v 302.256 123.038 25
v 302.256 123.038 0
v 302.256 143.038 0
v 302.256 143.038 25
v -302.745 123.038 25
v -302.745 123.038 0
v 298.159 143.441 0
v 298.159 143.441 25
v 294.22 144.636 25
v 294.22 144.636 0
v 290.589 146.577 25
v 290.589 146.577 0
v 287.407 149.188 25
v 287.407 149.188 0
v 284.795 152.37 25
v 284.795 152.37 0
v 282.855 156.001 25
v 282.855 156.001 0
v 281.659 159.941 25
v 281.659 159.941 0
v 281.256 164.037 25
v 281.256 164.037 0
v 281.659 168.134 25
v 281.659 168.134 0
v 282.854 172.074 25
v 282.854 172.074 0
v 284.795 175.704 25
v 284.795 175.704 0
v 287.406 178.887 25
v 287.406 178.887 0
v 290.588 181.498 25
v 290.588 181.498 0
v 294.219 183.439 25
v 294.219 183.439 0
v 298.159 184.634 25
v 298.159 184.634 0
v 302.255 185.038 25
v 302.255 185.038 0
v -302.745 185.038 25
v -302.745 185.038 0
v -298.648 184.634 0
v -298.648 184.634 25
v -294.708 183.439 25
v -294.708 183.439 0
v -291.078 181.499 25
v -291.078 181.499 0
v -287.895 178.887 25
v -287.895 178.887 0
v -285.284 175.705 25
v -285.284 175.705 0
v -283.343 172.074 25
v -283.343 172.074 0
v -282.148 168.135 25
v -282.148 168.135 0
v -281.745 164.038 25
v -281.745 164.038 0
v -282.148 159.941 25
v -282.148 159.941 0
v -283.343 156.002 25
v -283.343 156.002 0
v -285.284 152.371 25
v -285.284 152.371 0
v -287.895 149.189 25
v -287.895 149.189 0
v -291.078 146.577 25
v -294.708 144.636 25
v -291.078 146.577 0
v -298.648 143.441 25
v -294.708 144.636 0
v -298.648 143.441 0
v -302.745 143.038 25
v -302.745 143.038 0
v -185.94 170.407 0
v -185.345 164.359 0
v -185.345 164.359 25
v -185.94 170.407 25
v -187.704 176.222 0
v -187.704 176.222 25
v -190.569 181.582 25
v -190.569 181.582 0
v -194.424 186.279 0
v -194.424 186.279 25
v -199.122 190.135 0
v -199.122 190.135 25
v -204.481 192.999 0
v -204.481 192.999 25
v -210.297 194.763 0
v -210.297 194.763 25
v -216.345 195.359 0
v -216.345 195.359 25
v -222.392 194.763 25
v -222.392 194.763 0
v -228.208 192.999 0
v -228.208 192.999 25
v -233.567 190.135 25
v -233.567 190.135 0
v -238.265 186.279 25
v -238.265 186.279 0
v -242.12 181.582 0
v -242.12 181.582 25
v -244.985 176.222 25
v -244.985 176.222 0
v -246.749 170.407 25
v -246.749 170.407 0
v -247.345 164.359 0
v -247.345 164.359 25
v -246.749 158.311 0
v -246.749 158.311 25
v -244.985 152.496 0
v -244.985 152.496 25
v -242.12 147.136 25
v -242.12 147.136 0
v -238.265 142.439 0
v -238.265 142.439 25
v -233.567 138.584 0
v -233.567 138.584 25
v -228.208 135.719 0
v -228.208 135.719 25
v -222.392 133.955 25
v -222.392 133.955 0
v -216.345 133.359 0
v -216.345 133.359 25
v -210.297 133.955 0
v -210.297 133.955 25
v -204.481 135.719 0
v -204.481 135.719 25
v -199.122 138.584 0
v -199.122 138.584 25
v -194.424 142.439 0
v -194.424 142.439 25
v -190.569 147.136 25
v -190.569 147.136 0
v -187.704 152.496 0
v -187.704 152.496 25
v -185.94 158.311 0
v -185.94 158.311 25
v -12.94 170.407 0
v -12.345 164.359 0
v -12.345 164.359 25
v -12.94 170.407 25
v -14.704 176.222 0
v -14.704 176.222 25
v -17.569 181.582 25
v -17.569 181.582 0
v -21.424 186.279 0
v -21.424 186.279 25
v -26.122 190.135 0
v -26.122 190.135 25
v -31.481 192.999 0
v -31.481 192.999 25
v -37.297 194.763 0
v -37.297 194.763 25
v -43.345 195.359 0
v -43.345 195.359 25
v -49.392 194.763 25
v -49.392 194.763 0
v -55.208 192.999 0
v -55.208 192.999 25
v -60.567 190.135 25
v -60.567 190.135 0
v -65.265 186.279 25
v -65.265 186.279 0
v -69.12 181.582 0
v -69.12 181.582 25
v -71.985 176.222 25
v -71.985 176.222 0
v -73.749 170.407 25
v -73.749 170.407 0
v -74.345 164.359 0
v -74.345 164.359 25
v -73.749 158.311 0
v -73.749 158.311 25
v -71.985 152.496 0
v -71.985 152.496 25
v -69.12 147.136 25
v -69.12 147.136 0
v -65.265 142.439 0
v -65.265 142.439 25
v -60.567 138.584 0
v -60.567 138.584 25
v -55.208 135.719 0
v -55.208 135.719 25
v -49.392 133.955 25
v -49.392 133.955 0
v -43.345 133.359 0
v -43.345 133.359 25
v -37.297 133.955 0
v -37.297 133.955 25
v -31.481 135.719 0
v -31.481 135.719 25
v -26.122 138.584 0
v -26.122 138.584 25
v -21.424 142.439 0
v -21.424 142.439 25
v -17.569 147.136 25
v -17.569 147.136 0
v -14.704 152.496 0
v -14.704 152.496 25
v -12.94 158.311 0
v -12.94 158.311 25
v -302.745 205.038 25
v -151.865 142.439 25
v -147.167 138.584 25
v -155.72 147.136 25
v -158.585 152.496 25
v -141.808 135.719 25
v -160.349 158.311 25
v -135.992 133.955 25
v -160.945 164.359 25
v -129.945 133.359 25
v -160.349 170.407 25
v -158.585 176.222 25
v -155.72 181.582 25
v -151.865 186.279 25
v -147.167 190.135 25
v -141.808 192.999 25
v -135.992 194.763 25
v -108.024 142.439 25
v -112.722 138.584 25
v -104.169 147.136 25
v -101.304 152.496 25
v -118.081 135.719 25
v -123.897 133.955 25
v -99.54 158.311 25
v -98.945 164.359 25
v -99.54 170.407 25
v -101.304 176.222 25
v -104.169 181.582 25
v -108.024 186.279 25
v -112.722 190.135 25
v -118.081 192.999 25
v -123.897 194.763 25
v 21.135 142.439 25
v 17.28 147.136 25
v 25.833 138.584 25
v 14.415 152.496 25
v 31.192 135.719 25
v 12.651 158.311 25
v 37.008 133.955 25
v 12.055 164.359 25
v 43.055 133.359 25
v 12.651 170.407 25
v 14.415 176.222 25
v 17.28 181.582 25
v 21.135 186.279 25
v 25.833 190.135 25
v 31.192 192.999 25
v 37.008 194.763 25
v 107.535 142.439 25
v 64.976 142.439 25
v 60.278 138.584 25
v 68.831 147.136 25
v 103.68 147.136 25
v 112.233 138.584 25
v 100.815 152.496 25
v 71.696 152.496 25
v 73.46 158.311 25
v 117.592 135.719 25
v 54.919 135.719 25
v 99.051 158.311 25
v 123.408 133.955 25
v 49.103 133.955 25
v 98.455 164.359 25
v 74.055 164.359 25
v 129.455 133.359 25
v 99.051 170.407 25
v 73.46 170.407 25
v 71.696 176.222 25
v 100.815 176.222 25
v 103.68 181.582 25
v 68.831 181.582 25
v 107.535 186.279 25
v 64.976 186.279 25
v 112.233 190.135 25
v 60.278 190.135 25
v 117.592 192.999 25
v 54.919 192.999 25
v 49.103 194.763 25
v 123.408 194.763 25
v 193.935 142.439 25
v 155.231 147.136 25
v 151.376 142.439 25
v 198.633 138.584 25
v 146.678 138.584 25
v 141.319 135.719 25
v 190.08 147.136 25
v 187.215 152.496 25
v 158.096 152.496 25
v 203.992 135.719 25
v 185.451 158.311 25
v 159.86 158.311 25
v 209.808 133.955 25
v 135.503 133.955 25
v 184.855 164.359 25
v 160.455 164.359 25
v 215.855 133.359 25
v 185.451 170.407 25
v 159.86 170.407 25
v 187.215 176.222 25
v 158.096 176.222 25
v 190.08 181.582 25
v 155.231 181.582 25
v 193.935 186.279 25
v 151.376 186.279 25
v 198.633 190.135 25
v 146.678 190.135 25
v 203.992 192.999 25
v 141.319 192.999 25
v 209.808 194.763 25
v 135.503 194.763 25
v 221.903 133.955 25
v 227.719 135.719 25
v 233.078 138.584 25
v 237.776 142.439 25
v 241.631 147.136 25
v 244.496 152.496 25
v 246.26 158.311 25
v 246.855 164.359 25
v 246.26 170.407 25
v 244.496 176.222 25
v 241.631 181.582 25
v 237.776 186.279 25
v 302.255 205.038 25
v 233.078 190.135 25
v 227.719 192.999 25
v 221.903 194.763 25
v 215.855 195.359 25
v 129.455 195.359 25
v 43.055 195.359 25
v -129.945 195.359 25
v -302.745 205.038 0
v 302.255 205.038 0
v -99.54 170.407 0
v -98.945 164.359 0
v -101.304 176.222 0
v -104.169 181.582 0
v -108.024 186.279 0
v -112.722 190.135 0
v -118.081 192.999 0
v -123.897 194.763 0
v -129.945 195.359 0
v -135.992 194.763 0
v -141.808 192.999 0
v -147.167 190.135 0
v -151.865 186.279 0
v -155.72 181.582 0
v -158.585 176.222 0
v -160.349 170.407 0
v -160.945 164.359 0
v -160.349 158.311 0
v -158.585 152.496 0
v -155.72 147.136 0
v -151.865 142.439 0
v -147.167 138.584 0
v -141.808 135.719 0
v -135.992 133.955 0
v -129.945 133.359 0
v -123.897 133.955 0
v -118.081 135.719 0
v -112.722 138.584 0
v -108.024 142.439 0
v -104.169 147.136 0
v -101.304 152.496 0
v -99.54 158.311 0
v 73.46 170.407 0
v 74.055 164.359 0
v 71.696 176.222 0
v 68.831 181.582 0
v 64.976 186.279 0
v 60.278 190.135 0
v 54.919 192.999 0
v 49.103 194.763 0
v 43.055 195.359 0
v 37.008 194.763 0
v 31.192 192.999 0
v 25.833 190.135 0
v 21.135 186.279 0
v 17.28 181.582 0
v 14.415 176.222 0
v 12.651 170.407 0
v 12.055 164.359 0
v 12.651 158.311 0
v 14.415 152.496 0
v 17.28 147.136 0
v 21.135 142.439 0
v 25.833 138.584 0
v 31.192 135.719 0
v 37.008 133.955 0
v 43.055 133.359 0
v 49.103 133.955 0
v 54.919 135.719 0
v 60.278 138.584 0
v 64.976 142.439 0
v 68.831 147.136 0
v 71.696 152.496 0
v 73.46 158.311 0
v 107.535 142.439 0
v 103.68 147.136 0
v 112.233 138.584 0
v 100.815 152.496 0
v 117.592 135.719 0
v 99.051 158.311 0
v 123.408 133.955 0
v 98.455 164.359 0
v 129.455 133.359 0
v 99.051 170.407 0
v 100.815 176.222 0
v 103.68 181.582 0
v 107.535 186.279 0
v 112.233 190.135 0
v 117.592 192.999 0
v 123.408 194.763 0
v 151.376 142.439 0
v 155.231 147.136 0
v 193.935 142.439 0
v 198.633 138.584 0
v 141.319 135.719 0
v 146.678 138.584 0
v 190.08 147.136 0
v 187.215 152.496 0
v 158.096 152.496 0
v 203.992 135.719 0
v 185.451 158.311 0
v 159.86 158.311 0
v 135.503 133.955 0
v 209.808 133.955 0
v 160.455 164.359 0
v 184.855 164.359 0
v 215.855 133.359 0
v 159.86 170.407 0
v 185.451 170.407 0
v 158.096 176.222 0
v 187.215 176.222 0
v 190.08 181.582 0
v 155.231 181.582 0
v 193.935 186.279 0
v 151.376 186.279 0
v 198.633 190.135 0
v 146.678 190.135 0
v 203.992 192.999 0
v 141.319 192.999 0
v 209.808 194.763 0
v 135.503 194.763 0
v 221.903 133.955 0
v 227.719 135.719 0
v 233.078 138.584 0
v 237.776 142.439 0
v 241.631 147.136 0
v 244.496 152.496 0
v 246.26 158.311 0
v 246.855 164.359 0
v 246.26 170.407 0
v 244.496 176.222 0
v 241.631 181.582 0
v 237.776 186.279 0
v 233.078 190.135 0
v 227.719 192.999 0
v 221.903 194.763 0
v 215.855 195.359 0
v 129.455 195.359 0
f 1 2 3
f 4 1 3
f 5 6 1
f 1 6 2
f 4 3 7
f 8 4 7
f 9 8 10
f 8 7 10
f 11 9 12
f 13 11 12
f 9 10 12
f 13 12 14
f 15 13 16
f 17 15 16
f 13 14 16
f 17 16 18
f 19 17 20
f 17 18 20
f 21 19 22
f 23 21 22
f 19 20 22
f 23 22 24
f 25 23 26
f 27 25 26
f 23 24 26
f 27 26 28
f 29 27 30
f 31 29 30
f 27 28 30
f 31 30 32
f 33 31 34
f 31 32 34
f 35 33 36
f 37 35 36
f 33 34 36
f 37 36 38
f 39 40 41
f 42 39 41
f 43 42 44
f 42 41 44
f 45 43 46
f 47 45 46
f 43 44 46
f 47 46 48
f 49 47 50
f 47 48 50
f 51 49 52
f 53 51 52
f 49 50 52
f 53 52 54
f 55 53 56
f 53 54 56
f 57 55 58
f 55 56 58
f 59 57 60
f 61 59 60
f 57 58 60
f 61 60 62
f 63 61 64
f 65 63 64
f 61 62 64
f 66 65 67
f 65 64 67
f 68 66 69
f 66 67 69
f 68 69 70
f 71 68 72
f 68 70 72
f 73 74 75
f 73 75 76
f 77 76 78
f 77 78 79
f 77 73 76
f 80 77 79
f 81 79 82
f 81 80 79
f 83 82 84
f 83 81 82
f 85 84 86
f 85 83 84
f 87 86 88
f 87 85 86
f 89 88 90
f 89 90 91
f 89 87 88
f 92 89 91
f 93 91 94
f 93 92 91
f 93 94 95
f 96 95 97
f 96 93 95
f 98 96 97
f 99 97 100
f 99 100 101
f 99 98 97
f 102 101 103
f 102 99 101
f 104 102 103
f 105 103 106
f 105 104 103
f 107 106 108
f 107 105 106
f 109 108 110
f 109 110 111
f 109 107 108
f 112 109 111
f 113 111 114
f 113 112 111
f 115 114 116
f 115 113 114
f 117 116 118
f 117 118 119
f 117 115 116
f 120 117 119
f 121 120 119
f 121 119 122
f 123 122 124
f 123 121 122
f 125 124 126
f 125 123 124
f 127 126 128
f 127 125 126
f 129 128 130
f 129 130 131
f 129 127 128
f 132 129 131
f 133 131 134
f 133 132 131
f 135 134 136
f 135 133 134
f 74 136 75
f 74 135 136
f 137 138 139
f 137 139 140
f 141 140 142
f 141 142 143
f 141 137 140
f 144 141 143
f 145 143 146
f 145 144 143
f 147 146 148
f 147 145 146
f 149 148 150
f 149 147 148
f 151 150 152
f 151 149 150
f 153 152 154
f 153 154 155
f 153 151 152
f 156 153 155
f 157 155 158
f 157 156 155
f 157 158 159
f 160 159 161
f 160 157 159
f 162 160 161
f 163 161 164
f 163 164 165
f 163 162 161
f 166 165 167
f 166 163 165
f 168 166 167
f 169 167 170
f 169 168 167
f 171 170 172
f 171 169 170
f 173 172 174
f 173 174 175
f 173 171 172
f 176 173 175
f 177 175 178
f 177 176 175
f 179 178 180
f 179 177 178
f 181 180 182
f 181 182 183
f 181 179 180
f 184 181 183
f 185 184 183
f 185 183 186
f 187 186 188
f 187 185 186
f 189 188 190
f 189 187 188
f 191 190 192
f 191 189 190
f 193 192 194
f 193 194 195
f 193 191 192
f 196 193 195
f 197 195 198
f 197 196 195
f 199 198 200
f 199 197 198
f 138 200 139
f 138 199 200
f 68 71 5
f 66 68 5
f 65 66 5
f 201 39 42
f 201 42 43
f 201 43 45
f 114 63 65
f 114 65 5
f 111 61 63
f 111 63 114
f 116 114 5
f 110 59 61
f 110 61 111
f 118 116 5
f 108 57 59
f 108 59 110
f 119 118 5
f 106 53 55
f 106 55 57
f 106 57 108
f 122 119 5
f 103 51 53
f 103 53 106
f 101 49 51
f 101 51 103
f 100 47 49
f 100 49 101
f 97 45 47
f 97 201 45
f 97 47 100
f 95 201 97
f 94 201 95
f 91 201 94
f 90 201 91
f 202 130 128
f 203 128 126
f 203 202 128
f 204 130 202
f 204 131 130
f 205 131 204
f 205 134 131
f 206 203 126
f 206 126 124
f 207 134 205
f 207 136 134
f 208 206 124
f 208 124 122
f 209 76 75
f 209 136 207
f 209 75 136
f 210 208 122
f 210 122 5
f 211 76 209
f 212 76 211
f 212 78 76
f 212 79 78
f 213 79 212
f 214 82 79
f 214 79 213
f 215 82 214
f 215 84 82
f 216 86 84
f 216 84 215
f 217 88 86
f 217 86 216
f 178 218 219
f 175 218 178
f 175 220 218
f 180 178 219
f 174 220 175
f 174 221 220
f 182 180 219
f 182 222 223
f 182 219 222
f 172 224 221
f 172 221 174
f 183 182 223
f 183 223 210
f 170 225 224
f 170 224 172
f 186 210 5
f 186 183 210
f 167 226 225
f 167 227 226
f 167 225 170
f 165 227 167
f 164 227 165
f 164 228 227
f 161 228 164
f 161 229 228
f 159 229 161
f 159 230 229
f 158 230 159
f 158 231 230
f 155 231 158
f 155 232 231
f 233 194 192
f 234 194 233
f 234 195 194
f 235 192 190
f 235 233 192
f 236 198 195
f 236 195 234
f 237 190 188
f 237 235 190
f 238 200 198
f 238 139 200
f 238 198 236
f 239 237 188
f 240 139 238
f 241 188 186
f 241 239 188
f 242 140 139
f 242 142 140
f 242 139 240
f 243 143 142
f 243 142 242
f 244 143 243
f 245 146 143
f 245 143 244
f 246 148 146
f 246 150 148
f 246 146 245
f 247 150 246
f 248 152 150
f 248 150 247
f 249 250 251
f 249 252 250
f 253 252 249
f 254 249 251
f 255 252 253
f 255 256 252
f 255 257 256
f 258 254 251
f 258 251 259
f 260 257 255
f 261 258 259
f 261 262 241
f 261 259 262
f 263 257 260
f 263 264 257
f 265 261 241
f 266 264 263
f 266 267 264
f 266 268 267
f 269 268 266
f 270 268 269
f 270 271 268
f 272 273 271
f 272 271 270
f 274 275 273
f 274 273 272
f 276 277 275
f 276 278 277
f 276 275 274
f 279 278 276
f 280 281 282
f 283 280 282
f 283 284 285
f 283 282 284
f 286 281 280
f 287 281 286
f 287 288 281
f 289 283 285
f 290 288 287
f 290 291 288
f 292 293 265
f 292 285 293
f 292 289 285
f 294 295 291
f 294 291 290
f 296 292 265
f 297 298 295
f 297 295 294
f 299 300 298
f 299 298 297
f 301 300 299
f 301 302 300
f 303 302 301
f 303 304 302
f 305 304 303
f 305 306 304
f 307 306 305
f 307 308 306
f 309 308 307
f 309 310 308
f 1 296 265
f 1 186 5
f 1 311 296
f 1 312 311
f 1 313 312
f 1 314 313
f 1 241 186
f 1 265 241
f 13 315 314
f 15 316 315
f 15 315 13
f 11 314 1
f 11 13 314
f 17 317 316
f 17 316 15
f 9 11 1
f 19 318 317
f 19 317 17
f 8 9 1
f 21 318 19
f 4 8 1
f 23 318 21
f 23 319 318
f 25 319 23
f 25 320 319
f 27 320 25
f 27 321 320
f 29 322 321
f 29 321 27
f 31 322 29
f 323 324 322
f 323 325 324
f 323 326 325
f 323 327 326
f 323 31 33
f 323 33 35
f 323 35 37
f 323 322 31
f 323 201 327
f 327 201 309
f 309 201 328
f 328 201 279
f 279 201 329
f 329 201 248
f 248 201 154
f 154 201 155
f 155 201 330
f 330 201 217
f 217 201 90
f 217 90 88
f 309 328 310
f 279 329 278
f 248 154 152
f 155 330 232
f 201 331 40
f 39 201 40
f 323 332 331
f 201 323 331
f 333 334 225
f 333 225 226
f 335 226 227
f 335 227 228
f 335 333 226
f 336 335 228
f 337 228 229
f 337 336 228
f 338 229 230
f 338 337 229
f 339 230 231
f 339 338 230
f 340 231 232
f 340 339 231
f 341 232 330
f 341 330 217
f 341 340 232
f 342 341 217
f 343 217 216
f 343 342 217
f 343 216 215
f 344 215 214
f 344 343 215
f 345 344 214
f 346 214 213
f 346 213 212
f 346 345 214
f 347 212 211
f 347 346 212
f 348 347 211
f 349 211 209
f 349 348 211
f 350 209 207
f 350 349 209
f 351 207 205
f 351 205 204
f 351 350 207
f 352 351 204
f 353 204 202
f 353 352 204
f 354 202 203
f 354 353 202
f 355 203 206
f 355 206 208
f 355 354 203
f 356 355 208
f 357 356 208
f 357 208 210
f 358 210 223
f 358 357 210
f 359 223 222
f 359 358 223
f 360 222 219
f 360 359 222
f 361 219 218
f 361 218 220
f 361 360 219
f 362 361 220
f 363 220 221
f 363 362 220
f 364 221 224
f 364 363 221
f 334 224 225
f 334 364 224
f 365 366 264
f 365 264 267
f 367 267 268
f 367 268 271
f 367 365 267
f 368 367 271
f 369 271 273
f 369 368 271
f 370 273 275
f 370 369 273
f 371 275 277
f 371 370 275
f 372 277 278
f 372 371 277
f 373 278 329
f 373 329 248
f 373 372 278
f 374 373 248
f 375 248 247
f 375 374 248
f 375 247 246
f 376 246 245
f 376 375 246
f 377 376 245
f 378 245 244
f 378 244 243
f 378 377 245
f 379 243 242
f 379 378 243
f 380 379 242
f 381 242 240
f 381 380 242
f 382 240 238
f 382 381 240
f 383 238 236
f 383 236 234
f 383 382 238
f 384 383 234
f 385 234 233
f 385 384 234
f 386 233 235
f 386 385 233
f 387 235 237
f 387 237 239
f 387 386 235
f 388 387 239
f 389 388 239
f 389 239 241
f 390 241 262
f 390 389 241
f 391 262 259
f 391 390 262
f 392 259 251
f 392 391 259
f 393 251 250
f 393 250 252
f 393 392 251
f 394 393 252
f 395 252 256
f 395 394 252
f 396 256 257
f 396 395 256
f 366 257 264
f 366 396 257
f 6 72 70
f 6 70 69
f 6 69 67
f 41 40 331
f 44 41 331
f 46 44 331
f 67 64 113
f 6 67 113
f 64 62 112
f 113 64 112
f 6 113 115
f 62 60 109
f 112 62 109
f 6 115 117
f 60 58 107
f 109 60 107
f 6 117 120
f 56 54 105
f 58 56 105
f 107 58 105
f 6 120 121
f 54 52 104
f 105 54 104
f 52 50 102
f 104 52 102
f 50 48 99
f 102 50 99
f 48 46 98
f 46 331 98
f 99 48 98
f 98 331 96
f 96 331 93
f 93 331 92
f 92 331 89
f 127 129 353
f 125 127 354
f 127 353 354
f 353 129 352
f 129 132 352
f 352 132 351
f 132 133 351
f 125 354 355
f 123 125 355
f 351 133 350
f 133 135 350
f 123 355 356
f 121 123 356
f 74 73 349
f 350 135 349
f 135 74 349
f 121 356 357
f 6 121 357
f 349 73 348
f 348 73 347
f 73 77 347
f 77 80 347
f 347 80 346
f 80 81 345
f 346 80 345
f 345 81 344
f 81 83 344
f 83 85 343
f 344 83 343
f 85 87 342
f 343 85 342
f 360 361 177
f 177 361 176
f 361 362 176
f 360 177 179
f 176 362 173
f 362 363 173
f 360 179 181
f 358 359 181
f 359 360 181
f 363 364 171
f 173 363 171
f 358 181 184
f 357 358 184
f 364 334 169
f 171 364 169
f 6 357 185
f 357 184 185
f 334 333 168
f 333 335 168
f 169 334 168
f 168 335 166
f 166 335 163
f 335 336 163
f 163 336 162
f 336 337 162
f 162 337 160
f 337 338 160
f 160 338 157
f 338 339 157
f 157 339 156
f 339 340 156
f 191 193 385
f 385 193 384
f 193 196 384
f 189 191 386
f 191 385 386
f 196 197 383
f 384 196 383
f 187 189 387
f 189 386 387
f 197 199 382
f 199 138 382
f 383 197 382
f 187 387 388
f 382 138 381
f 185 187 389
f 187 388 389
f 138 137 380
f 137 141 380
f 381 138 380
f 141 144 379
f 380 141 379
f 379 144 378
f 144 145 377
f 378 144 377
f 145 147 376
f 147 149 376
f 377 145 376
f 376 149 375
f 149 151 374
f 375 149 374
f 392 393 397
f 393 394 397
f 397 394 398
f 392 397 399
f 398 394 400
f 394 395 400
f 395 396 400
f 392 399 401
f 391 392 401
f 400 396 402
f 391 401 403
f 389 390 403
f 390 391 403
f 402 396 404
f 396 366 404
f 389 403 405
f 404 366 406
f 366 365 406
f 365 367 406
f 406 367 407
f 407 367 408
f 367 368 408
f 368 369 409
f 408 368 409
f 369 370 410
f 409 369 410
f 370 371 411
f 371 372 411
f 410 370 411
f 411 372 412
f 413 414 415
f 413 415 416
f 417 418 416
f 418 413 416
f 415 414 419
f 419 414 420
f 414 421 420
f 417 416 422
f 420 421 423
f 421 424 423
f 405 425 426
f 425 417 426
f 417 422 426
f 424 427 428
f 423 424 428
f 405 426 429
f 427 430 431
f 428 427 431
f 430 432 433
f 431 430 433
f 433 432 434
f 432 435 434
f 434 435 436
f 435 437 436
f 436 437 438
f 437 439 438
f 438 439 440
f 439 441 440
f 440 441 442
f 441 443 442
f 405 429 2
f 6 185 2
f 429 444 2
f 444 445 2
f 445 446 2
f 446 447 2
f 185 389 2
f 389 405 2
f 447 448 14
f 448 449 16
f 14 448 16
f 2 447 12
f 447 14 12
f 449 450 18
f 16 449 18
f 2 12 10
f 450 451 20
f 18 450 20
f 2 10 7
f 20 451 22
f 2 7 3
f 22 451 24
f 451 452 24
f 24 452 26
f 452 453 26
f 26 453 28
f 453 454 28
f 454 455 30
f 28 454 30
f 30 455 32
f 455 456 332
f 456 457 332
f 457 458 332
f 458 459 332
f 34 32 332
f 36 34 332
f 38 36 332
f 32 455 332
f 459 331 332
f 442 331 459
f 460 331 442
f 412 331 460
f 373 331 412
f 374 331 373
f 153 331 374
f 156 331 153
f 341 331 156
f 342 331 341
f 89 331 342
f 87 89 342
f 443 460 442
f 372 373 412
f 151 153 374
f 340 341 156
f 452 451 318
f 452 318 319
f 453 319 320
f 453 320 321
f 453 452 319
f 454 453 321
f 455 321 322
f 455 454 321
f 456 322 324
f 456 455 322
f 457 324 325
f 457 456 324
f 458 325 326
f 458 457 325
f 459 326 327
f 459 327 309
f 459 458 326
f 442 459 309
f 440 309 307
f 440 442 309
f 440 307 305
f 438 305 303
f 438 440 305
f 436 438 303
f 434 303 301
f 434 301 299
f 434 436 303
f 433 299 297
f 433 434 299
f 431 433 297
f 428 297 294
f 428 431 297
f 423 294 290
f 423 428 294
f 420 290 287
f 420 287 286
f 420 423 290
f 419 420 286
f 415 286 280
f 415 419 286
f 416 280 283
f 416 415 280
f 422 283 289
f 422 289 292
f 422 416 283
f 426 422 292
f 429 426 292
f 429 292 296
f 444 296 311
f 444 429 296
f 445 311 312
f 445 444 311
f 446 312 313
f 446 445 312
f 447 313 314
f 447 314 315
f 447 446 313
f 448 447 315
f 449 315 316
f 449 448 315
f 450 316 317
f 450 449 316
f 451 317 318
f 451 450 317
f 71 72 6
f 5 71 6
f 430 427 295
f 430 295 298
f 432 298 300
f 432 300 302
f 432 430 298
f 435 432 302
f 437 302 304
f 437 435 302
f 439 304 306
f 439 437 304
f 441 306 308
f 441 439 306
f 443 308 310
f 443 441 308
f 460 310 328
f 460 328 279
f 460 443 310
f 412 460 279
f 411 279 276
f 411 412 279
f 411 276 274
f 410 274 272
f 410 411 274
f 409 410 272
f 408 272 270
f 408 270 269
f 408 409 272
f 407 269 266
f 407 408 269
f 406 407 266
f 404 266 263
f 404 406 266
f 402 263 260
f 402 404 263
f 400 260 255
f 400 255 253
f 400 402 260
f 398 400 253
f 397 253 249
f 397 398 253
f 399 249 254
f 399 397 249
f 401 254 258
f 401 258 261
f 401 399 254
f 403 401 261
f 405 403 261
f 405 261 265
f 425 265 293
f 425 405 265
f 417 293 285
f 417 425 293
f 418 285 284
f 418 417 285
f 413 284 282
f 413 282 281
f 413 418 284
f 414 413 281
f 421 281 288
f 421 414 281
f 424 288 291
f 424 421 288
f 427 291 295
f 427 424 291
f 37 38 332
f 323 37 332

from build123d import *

# Parameters (mm, degrees)
F0_R     = 31
F1_DEPTH = 25


# Not quite as in the source:
# - ends of sketch curves that miss each other by under 0.0002 mm in the source are joined


with BuildPart() as f1:
    # F0 (on Top) → F1 (new body)
    with BuildSketch(Plane.XY):
        with BuildLine():
            Line((-302.7446055809, 143.0378559404), (-302.7446061336, 123.0378559404))
            Line((-302.7446061336, 123.0378559404), (302.2563133603, 123.0378559404))
            Line((302.2563133603, 123.0378559404), (302.2563133603, 143.0378559404))
            ThreePointArc((302.2563133603, 143.0378559404), (281.2558506145, 164.0373893883), (302.2553878584, 185.0378521342))
            Line((302.2553878584, 185.0378521342), (302.2553878585, 205.0378483381))
            Line((302.2553878585, 205.0378483381), (-302.7446121415, 205.0378559404))
            Line((-302.7446121415, 205.0378559404), (-302.7446123928, 185.0378559404))
            ThreePointArc((-302.7446123928, 185.0378559404), (-281.7446089869, 164.0378593463), (-302.7446055809, 143.0378559404))
        make_face()
        with Locations((-216.3446089869, 164.3591374159)):
            Circle(F0_R, mode=Mode.SUBTRACT)
        with Locations((-129.9446089869, 164.3591374159)):
            Circle(F0_R, mode=Mode.SUBTRACT)
        with Locations((-43.3446089869, 164.3591374159)):
            Circle(F0_R, mode=Mode.SUBTRACT)
        with Locations((43.0553910131, 164.3591374159)):
            Circle(F0_R, mode=Mode.SUBTRACT)
        with Locations((129.4553910131, 164.3591374159)):
            Circle(F0_R, mode=Mode.SUBTRACT)
        with Locations((215.8553910131, 164.3591374159)):
            Circle(F0_R, mode=Mode.SUBTRACT)
    extrude(amount=F1_DEPTH)


solid = f1.part
